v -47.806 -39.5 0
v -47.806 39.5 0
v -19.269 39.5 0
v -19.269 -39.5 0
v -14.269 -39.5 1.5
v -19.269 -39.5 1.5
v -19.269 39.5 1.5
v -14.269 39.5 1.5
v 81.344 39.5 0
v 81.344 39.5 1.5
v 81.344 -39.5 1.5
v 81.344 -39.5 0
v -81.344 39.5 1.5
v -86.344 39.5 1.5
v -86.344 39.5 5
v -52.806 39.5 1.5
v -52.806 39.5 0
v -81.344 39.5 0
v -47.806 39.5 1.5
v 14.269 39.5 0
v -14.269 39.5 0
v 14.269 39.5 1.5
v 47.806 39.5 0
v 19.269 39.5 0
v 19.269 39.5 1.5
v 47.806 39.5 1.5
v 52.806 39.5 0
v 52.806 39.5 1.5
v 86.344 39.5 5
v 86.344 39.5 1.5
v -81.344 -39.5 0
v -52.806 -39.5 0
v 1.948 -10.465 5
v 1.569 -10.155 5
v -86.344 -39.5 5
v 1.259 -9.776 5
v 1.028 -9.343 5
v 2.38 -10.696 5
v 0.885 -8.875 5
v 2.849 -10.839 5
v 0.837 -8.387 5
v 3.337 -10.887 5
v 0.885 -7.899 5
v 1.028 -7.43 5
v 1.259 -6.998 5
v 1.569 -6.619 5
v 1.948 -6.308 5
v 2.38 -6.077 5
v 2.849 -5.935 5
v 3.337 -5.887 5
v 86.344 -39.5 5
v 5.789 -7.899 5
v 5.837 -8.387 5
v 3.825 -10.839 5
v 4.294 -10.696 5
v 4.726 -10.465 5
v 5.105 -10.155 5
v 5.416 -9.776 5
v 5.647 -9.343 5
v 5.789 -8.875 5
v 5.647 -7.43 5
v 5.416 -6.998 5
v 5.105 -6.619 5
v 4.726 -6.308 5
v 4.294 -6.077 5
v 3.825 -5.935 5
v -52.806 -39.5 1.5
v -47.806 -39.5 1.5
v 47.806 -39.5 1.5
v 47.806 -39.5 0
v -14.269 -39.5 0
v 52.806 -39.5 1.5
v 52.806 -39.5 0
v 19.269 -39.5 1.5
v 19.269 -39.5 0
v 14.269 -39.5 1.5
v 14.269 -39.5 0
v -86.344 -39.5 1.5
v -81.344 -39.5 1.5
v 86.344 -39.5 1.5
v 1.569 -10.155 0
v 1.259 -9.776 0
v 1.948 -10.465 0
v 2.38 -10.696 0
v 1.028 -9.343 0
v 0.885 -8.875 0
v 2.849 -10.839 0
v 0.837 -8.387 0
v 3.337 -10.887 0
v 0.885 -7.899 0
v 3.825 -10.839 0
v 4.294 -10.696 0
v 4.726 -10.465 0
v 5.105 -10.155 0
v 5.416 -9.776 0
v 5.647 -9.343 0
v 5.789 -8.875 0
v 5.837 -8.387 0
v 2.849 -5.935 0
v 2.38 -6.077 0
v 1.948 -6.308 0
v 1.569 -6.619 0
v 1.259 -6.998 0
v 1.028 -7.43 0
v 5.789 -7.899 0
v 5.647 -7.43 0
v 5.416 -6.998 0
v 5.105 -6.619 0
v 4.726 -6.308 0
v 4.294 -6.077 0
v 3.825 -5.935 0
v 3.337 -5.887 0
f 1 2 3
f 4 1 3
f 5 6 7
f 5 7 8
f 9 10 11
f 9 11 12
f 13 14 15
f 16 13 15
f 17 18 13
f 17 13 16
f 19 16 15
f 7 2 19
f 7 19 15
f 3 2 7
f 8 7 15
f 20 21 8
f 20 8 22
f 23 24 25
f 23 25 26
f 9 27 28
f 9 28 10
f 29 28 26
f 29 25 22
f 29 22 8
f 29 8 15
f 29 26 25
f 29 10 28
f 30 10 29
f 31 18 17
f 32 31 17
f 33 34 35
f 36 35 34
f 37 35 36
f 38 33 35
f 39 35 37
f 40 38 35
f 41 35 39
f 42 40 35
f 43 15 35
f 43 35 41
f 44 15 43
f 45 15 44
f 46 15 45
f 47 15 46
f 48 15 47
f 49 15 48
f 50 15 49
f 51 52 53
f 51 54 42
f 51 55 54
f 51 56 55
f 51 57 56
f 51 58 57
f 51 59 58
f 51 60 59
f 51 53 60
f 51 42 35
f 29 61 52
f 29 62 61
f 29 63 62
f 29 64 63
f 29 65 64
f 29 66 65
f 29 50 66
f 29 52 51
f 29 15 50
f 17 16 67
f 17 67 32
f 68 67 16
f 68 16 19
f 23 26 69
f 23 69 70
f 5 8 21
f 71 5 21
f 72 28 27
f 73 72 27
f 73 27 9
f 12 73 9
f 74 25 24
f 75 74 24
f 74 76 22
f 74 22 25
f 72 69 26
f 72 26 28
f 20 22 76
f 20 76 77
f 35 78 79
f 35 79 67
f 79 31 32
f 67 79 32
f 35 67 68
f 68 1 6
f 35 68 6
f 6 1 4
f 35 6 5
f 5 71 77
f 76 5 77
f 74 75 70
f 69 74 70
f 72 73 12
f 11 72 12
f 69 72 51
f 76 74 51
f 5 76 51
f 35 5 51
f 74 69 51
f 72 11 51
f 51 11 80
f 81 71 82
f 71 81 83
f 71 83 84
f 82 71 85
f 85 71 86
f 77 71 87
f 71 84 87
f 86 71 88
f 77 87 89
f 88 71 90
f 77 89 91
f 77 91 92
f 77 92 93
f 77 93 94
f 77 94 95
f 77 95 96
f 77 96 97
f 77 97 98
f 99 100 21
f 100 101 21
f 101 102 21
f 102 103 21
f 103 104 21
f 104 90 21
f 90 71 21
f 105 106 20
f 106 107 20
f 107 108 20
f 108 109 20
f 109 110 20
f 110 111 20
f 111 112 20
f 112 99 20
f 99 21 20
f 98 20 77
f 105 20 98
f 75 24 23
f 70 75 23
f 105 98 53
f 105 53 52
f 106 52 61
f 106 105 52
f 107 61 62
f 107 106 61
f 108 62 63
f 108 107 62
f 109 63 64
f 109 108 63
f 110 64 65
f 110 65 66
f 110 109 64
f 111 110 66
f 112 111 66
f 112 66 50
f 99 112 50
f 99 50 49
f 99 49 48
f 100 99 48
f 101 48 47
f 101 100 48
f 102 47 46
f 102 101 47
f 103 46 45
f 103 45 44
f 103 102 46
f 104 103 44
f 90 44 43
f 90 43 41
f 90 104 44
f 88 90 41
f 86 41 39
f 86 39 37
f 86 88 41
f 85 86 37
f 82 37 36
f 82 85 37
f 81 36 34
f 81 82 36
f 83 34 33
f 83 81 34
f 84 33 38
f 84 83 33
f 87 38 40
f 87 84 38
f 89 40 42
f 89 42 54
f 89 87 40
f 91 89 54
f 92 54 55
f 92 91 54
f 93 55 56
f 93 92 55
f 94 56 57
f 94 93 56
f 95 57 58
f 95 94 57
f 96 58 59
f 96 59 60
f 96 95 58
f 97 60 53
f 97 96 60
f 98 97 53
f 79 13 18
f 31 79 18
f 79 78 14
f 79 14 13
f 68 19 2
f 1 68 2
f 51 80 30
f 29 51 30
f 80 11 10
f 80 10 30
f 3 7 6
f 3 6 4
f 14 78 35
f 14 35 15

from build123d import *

# Parameters (mm, degrees)
SKETCH1_W           = 172.688303012
SKETCH1_H           = 79
SKETCH1_R           = 2.5
BOSS_EXTRUDE1_DEPTH = 5
CUT_EXTRUDE1_REACH  = 81
SKETCH2_W           = 5
SKETCH2_H           = 1.5


with BuildPart() as part:
    # Sketch1 → Boss-Extrude1 (new body)
    with BuildSketch(Plane.XY):
        Rectangle(SKETCH1_W, SKETCH1_H)
        with Locations((3.337204705, -8.386778216)):
            Circle(SKETCH1_R, mode=Mode.SUBTRACT)
    extrude(amount=BOSS_EXTRUDE1_DEPTH)

    # Sketch2 → Cut-Extrude1 (cut, up to next)
    with BuildSketch(Plane(origin=(0, 39.5, 0), x_dir=(1, 0, 0), z_dir=(0, 1, 0)), mode=Mode.PRIVATE) as cut_extrude1_sk1:
        with Locations((83.844151506, -0.75)):
            Rectangle(SKETCH2_W, SKETCH2_H)
    cut_extrude1_tool1 = extrude(cut_extrude1_sk1.sketch, amount=-CUT_EXTRUDE1_REACH, mode=Mode.PRIVATE) & part.part
    add(cut_extrude1_tool1.solids().sort_by_distance((83.844152, 39.5, 0.75))[0], mode=Mode.SUBTRACT)
    # Sketch2 → Cut-Extrude1 (cut, up to next)
    with BuildSketch(Plane(origin=(0, 39.5, 0), x_dir=(1, 0, 0), z_dir=(0, 1, 0)), mode=Mode.PRIVATE) as cut_extrude1_sk2:
        with Locations((50.306490903, -0.75)):
            Rectangle(SKETCH2_W, SKETCH2_H)
    cut_extrude1_tool2 = extrude(cut_extrude1_sk2.sketch, amount=-CUT_EXTRUDE1_REACH, mode=Mode.PRIVATE) & part.part
    add(cut_extrude1_tool2.solids().sort_by_distance((50.306491, 39.5, 0.75))[0], mode=Mode.SUBTRACT)
    # Sketch2 → Cut-Extrude1 (cut, up to next)
    with BuildSketch(Plane(origin=(0, 39.5, 0), x_dir=(1, 0, 0), z_dir=(0, 1, 0)), mode=Mode.PRIVATE) as cut_extrude1_sk3:
        with Locations((16.768830301, -0.75)):
            Rectangle(SKETCH2_W, SKETCH2_H)
    cut_extrude1_tool3 = extrude(cut_extrude1_sk3.sketch, amount=-CUT_EXTRUDE1_REACH, mode=Mode.PRIVATE) & part.part
    add(cut_extrude1_tool3.solids().sort_by_distance((16.76883, 39.5, 0.75))[0], mode=Mode.SUBTRACT)
    # Sketch2 → Cut-Extrude1 (cut, up to next)
    with BuildSketch(Plane(origin=(0, 39.5, 0), x_dir=(1, 0, 0), z_dir=(0, 1, 0)), mode=Mode.PRIVATE) as cut_extrude1_sk4:
        with Locations((-16.768830301, -0.75)):
            Rectangle(SKETCH2_W, SKETCH2_H)
    cut_extrude1_tool4 = extrude(cut_extrude1_sk4.sketch, amount=-CUT_EXTRUDE1_REACH, mode=Mode.PRIVATE) & part.part
    add(cut_extrude1_tool4.solids().sort_by_distance((-16.76883, 39.5, 0.75))[0], mode=Mode.SUBTRACT)
    # Sketch2 → Cut-Extrude1 (cut, up to next)
    with BuildSketch(Plane(origin=(0, 39.5, 0), x_dir=(1, 0, 0), z_dir=(0, 1, 0)), mode=Mode.PRIVATE) as cut_extrude1_sk5:
        with Locations((-50.306490903, -0.75)):
            Rectangle(SKETCH2_W, SKETCH2_H)
    cut_extrude1_tool5 = extrude(cut_extrude1_sk5.sketch, amount=-CUT_EXTRUDE1_REACH, mode=Mode.PRIVATE) & part.part
    add(cut_extrude1_tool5.solids().sort_by_distance((-50.306491, 39.5, 0.75))[0], mode=Mode.SUBTRACT)
    # Sketch2 → Cut-Extrude1 (cut, up to next)
    with BuildSketch(Plane(origin=(0, 39.5, 0), x_dir=(1, 0, 0), z_dir=(0, 1, 0)), mode=Mode.PRIVATE) as cut_extrude1_sk6:
        with Locations((-83.844151506, -0.75)):
            Rectangle(SKETCH2_W, SKETCH2_H)
    cut_extrude1_tool6 = extrude(cut_extrude1_sk6.sketch, amount=-CUT_EXTRUDE1_REACH, mode=Mode.PRIVATE) & part.part
    add(cut_extrude1_tool6.solids().sort_by_distance((-83.844152, 39.5, 0.75))[0], mode=Mode.SUBTRACT)


solid = part.part
